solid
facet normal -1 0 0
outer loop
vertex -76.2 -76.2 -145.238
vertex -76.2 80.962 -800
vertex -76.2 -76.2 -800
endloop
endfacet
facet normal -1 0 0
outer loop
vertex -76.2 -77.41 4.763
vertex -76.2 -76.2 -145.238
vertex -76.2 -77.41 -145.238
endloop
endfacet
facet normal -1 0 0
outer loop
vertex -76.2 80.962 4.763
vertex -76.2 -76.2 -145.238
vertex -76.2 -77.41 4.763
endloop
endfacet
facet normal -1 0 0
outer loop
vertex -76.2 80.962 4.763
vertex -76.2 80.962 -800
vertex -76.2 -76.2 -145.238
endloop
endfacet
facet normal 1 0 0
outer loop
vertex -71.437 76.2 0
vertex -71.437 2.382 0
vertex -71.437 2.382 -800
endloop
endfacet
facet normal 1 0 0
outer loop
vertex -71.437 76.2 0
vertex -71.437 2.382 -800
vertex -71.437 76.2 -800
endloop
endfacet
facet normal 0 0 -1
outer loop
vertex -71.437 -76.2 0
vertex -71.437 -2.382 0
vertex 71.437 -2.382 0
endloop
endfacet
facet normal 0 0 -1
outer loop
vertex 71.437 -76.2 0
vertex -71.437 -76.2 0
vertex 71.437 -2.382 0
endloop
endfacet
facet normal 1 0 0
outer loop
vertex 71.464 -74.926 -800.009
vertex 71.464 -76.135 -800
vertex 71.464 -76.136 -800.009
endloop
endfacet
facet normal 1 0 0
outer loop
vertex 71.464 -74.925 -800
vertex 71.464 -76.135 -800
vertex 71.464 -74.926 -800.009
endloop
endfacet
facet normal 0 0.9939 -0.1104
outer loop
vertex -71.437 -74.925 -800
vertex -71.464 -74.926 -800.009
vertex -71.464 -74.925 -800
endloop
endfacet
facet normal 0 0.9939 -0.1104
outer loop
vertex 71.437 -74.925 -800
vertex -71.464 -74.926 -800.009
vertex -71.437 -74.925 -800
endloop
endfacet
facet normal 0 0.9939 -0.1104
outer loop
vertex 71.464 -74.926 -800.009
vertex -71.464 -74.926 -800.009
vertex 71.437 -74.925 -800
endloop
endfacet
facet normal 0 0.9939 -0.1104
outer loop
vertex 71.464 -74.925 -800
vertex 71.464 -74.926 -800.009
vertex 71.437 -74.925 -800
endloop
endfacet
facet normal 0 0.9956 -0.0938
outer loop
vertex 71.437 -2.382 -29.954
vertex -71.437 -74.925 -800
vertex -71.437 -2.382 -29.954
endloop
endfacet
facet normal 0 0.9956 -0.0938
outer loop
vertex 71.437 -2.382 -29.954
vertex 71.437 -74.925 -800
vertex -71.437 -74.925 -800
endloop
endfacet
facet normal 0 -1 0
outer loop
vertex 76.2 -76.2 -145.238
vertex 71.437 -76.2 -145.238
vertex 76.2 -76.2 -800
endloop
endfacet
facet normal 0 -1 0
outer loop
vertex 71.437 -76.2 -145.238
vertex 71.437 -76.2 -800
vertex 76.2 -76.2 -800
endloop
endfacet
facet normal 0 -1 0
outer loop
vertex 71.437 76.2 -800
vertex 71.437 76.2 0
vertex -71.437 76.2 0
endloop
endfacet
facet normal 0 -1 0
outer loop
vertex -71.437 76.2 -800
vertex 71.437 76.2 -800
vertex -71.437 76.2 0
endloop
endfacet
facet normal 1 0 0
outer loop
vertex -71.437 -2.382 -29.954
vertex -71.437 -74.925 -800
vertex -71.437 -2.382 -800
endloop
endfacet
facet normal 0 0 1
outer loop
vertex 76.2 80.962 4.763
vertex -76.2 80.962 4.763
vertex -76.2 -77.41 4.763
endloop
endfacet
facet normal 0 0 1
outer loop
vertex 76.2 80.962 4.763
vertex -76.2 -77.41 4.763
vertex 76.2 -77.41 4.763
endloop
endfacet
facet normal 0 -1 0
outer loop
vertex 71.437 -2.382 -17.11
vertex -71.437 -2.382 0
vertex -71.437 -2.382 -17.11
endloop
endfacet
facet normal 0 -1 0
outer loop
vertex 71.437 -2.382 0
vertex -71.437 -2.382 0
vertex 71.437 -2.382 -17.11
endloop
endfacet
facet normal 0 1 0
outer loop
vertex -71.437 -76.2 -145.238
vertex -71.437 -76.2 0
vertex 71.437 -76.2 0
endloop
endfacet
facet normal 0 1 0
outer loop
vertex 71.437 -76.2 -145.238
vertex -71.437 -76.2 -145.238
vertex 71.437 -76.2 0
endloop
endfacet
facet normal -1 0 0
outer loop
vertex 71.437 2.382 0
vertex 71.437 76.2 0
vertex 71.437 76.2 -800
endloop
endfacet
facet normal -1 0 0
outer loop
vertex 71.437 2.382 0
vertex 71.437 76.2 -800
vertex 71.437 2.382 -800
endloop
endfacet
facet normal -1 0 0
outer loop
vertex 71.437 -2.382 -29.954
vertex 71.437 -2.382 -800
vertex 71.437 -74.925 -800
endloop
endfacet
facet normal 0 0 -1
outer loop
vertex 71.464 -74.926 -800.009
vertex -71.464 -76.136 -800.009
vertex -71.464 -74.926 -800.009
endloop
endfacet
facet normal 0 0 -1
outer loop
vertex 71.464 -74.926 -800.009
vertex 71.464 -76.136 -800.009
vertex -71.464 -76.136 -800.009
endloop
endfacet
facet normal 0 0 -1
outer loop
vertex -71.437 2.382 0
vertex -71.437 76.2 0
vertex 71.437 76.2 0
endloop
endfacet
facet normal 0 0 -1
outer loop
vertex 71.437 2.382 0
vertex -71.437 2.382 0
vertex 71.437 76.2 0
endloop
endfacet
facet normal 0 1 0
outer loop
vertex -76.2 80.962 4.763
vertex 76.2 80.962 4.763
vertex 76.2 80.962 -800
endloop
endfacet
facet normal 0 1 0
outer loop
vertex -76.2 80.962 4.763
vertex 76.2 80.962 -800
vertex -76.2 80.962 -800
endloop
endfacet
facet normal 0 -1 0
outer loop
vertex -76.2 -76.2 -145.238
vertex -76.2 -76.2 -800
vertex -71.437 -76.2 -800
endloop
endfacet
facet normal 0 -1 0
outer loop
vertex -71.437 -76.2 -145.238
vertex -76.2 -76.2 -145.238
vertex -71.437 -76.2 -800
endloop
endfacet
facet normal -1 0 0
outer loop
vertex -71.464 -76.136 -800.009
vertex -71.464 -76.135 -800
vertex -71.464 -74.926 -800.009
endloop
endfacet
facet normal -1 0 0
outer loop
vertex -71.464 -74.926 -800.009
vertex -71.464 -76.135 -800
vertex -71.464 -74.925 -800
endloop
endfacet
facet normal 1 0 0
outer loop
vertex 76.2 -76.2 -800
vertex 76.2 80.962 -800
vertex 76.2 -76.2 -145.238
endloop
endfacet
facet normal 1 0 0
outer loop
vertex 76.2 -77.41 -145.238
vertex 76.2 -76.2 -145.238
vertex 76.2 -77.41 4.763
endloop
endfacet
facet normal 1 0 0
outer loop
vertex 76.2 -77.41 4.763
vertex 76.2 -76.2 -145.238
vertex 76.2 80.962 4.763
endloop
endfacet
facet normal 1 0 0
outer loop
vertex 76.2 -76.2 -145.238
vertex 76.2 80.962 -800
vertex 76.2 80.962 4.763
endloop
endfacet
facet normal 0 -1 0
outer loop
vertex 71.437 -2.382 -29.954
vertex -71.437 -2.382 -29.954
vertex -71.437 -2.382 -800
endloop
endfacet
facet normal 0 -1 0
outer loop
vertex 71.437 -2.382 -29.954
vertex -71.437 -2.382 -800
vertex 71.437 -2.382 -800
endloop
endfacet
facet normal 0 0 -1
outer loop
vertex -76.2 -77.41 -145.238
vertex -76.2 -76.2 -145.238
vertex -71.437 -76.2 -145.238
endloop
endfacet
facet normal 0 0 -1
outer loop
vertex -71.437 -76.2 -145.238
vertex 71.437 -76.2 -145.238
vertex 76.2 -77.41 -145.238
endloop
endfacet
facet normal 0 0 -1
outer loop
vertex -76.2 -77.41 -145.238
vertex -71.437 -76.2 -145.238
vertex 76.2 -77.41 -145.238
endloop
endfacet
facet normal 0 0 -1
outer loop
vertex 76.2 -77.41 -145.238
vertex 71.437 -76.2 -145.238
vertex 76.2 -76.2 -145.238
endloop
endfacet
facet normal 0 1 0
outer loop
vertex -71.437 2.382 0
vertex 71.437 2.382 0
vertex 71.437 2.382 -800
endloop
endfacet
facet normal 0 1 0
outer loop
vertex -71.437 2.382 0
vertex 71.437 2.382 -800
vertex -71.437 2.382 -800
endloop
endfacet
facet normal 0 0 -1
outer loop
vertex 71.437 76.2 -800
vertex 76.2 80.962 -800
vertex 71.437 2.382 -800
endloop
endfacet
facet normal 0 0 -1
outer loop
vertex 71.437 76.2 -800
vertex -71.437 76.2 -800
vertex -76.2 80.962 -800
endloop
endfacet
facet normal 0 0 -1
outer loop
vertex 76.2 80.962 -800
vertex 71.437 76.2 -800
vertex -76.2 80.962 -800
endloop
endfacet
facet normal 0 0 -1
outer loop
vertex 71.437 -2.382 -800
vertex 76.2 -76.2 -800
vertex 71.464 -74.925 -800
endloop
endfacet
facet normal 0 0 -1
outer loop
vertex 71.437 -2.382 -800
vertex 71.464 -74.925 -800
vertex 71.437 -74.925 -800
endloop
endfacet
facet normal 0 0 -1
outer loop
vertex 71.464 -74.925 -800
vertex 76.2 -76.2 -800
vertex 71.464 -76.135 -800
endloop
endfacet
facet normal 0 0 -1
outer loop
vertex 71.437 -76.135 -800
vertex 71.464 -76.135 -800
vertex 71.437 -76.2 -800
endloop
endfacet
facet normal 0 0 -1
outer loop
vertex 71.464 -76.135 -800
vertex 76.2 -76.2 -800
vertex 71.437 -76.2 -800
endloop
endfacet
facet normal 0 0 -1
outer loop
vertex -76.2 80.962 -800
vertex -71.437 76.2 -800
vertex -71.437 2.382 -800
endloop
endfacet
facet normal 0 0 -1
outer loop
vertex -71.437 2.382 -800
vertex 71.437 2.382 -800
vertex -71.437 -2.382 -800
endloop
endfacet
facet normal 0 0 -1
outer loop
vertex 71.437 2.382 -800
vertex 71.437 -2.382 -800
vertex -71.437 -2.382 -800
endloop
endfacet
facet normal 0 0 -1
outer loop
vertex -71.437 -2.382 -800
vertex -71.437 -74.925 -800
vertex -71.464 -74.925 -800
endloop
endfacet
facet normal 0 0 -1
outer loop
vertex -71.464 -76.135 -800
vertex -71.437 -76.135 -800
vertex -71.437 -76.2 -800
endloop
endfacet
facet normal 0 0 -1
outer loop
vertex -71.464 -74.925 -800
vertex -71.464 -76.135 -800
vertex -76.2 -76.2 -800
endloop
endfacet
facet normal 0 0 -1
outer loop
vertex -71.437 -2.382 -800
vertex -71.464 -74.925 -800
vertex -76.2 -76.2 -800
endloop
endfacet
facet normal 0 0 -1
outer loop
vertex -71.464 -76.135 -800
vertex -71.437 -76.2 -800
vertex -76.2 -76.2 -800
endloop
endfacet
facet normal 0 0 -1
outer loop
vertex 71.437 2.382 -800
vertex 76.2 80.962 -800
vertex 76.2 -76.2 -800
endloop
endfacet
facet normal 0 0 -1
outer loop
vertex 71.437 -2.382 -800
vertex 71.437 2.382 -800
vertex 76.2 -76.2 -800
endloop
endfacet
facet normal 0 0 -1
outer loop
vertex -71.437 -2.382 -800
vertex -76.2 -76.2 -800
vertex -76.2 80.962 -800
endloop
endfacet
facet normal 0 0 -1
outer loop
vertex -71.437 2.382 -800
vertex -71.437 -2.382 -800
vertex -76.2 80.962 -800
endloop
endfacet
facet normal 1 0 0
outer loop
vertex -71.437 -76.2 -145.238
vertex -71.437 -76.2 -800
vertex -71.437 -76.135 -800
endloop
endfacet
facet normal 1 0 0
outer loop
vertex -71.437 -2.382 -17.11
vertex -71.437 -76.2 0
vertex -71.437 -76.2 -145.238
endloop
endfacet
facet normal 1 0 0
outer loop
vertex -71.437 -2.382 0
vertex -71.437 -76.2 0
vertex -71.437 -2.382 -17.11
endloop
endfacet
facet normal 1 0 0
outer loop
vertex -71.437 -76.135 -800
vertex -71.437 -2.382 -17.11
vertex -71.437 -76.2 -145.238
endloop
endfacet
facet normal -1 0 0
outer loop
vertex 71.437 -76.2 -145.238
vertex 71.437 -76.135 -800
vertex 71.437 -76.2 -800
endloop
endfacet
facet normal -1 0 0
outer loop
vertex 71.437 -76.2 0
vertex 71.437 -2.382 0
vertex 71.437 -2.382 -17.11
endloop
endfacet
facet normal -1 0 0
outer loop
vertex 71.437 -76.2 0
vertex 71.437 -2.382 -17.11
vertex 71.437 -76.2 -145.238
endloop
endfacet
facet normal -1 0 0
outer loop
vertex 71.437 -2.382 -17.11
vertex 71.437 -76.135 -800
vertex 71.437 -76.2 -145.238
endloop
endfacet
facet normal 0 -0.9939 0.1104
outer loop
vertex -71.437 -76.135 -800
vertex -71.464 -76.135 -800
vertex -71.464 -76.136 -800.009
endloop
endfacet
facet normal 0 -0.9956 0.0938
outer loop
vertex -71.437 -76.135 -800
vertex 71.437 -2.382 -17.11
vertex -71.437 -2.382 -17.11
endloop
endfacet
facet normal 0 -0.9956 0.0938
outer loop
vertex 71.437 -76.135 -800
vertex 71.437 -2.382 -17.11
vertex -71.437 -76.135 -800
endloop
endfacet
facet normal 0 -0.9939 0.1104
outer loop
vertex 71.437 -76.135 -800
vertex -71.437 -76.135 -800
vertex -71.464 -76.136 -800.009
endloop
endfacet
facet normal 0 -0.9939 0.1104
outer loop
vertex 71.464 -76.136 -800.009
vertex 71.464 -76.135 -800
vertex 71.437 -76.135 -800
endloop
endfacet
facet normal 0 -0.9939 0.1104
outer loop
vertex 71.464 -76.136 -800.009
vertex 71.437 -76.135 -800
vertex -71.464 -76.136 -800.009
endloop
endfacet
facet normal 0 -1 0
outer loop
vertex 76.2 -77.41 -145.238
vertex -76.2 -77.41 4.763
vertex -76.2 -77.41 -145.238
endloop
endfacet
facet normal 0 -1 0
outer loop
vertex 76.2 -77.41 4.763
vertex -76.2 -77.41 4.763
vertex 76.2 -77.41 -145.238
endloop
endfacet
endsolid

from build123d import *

# Parameters (mm, degrees)
F1_DEPTH = 800
F2_W     = 152.4
F2_H     = 152.4
F3_DEPTH = 4.7625
F4_W     = 152.4
F4_H     = 804.7625
F5_DEPTH = 4.7625
F6_W     = 152.4
F6_H     = 150
F7_DEPTH = 1.21
F9_DEPTH = 71.464


# Not quite as in the source:
# - a length typed as a fraction of an inch, garbled in the dataset ("3 / 203.2 mm" for 3/8 in), is restored


with BuildPart() as f1:
    # F0 (on Top) → F1 (new body)
    with BuildSketch(Plane.XY):
        Polygon((-76.2, 76.2), (-76.2, -76.2), (-71.437, -76.2), (-71.437, -2.3815), (71.437, -2.3815), (71.437, -76.2), (76.2, -76.2), (76.2, 76.2), (71.437, 76.2), (71.437, 2.382), (-71.437, 2.382), (-71.437, 76.2), align=None)
    extrude(amount=-F1_DEPTH)

    # F2 (on face) → F3 (join)
    with BuildSketch(Plane.XY):
        Rectangle(F2_W, F2_H)
    extrude(amount=F3_DEPTH)

    # F4 (on face) → F5 (join)
    with BuildSketch(Plane(origin=(0, 76.2, 0), x_dir=(-1, 0, 0), z_dir=(0, 1, 0))):
        with Locations((0, -397.61875)):
            Rectangle(F4_W, F4_H)
    extrude(amount=F5_DEPTH)

    # F6 (on face) → F7 (join)
    with BuildSketch(Plane.XZ.offset(76.2)):
        with Locations((0, -70.2375)):
            Rectangle(F6_W, F6_H)
    extrude(amount=F7_DEPTH)

    # F8 (on Right) → F9 (join, symmetric)
    with BuildSketch(Plane.YZ):
        Polygon((-76.13632828, -800.0091910362), (-74.92632828, -800.0091910362), (0.8852251628, 4.7220308334), (-0.3247748372, 4.7220308334), align=None)
    extrude(amount=F9_DEPTH, both=True)


solid = f1.part
